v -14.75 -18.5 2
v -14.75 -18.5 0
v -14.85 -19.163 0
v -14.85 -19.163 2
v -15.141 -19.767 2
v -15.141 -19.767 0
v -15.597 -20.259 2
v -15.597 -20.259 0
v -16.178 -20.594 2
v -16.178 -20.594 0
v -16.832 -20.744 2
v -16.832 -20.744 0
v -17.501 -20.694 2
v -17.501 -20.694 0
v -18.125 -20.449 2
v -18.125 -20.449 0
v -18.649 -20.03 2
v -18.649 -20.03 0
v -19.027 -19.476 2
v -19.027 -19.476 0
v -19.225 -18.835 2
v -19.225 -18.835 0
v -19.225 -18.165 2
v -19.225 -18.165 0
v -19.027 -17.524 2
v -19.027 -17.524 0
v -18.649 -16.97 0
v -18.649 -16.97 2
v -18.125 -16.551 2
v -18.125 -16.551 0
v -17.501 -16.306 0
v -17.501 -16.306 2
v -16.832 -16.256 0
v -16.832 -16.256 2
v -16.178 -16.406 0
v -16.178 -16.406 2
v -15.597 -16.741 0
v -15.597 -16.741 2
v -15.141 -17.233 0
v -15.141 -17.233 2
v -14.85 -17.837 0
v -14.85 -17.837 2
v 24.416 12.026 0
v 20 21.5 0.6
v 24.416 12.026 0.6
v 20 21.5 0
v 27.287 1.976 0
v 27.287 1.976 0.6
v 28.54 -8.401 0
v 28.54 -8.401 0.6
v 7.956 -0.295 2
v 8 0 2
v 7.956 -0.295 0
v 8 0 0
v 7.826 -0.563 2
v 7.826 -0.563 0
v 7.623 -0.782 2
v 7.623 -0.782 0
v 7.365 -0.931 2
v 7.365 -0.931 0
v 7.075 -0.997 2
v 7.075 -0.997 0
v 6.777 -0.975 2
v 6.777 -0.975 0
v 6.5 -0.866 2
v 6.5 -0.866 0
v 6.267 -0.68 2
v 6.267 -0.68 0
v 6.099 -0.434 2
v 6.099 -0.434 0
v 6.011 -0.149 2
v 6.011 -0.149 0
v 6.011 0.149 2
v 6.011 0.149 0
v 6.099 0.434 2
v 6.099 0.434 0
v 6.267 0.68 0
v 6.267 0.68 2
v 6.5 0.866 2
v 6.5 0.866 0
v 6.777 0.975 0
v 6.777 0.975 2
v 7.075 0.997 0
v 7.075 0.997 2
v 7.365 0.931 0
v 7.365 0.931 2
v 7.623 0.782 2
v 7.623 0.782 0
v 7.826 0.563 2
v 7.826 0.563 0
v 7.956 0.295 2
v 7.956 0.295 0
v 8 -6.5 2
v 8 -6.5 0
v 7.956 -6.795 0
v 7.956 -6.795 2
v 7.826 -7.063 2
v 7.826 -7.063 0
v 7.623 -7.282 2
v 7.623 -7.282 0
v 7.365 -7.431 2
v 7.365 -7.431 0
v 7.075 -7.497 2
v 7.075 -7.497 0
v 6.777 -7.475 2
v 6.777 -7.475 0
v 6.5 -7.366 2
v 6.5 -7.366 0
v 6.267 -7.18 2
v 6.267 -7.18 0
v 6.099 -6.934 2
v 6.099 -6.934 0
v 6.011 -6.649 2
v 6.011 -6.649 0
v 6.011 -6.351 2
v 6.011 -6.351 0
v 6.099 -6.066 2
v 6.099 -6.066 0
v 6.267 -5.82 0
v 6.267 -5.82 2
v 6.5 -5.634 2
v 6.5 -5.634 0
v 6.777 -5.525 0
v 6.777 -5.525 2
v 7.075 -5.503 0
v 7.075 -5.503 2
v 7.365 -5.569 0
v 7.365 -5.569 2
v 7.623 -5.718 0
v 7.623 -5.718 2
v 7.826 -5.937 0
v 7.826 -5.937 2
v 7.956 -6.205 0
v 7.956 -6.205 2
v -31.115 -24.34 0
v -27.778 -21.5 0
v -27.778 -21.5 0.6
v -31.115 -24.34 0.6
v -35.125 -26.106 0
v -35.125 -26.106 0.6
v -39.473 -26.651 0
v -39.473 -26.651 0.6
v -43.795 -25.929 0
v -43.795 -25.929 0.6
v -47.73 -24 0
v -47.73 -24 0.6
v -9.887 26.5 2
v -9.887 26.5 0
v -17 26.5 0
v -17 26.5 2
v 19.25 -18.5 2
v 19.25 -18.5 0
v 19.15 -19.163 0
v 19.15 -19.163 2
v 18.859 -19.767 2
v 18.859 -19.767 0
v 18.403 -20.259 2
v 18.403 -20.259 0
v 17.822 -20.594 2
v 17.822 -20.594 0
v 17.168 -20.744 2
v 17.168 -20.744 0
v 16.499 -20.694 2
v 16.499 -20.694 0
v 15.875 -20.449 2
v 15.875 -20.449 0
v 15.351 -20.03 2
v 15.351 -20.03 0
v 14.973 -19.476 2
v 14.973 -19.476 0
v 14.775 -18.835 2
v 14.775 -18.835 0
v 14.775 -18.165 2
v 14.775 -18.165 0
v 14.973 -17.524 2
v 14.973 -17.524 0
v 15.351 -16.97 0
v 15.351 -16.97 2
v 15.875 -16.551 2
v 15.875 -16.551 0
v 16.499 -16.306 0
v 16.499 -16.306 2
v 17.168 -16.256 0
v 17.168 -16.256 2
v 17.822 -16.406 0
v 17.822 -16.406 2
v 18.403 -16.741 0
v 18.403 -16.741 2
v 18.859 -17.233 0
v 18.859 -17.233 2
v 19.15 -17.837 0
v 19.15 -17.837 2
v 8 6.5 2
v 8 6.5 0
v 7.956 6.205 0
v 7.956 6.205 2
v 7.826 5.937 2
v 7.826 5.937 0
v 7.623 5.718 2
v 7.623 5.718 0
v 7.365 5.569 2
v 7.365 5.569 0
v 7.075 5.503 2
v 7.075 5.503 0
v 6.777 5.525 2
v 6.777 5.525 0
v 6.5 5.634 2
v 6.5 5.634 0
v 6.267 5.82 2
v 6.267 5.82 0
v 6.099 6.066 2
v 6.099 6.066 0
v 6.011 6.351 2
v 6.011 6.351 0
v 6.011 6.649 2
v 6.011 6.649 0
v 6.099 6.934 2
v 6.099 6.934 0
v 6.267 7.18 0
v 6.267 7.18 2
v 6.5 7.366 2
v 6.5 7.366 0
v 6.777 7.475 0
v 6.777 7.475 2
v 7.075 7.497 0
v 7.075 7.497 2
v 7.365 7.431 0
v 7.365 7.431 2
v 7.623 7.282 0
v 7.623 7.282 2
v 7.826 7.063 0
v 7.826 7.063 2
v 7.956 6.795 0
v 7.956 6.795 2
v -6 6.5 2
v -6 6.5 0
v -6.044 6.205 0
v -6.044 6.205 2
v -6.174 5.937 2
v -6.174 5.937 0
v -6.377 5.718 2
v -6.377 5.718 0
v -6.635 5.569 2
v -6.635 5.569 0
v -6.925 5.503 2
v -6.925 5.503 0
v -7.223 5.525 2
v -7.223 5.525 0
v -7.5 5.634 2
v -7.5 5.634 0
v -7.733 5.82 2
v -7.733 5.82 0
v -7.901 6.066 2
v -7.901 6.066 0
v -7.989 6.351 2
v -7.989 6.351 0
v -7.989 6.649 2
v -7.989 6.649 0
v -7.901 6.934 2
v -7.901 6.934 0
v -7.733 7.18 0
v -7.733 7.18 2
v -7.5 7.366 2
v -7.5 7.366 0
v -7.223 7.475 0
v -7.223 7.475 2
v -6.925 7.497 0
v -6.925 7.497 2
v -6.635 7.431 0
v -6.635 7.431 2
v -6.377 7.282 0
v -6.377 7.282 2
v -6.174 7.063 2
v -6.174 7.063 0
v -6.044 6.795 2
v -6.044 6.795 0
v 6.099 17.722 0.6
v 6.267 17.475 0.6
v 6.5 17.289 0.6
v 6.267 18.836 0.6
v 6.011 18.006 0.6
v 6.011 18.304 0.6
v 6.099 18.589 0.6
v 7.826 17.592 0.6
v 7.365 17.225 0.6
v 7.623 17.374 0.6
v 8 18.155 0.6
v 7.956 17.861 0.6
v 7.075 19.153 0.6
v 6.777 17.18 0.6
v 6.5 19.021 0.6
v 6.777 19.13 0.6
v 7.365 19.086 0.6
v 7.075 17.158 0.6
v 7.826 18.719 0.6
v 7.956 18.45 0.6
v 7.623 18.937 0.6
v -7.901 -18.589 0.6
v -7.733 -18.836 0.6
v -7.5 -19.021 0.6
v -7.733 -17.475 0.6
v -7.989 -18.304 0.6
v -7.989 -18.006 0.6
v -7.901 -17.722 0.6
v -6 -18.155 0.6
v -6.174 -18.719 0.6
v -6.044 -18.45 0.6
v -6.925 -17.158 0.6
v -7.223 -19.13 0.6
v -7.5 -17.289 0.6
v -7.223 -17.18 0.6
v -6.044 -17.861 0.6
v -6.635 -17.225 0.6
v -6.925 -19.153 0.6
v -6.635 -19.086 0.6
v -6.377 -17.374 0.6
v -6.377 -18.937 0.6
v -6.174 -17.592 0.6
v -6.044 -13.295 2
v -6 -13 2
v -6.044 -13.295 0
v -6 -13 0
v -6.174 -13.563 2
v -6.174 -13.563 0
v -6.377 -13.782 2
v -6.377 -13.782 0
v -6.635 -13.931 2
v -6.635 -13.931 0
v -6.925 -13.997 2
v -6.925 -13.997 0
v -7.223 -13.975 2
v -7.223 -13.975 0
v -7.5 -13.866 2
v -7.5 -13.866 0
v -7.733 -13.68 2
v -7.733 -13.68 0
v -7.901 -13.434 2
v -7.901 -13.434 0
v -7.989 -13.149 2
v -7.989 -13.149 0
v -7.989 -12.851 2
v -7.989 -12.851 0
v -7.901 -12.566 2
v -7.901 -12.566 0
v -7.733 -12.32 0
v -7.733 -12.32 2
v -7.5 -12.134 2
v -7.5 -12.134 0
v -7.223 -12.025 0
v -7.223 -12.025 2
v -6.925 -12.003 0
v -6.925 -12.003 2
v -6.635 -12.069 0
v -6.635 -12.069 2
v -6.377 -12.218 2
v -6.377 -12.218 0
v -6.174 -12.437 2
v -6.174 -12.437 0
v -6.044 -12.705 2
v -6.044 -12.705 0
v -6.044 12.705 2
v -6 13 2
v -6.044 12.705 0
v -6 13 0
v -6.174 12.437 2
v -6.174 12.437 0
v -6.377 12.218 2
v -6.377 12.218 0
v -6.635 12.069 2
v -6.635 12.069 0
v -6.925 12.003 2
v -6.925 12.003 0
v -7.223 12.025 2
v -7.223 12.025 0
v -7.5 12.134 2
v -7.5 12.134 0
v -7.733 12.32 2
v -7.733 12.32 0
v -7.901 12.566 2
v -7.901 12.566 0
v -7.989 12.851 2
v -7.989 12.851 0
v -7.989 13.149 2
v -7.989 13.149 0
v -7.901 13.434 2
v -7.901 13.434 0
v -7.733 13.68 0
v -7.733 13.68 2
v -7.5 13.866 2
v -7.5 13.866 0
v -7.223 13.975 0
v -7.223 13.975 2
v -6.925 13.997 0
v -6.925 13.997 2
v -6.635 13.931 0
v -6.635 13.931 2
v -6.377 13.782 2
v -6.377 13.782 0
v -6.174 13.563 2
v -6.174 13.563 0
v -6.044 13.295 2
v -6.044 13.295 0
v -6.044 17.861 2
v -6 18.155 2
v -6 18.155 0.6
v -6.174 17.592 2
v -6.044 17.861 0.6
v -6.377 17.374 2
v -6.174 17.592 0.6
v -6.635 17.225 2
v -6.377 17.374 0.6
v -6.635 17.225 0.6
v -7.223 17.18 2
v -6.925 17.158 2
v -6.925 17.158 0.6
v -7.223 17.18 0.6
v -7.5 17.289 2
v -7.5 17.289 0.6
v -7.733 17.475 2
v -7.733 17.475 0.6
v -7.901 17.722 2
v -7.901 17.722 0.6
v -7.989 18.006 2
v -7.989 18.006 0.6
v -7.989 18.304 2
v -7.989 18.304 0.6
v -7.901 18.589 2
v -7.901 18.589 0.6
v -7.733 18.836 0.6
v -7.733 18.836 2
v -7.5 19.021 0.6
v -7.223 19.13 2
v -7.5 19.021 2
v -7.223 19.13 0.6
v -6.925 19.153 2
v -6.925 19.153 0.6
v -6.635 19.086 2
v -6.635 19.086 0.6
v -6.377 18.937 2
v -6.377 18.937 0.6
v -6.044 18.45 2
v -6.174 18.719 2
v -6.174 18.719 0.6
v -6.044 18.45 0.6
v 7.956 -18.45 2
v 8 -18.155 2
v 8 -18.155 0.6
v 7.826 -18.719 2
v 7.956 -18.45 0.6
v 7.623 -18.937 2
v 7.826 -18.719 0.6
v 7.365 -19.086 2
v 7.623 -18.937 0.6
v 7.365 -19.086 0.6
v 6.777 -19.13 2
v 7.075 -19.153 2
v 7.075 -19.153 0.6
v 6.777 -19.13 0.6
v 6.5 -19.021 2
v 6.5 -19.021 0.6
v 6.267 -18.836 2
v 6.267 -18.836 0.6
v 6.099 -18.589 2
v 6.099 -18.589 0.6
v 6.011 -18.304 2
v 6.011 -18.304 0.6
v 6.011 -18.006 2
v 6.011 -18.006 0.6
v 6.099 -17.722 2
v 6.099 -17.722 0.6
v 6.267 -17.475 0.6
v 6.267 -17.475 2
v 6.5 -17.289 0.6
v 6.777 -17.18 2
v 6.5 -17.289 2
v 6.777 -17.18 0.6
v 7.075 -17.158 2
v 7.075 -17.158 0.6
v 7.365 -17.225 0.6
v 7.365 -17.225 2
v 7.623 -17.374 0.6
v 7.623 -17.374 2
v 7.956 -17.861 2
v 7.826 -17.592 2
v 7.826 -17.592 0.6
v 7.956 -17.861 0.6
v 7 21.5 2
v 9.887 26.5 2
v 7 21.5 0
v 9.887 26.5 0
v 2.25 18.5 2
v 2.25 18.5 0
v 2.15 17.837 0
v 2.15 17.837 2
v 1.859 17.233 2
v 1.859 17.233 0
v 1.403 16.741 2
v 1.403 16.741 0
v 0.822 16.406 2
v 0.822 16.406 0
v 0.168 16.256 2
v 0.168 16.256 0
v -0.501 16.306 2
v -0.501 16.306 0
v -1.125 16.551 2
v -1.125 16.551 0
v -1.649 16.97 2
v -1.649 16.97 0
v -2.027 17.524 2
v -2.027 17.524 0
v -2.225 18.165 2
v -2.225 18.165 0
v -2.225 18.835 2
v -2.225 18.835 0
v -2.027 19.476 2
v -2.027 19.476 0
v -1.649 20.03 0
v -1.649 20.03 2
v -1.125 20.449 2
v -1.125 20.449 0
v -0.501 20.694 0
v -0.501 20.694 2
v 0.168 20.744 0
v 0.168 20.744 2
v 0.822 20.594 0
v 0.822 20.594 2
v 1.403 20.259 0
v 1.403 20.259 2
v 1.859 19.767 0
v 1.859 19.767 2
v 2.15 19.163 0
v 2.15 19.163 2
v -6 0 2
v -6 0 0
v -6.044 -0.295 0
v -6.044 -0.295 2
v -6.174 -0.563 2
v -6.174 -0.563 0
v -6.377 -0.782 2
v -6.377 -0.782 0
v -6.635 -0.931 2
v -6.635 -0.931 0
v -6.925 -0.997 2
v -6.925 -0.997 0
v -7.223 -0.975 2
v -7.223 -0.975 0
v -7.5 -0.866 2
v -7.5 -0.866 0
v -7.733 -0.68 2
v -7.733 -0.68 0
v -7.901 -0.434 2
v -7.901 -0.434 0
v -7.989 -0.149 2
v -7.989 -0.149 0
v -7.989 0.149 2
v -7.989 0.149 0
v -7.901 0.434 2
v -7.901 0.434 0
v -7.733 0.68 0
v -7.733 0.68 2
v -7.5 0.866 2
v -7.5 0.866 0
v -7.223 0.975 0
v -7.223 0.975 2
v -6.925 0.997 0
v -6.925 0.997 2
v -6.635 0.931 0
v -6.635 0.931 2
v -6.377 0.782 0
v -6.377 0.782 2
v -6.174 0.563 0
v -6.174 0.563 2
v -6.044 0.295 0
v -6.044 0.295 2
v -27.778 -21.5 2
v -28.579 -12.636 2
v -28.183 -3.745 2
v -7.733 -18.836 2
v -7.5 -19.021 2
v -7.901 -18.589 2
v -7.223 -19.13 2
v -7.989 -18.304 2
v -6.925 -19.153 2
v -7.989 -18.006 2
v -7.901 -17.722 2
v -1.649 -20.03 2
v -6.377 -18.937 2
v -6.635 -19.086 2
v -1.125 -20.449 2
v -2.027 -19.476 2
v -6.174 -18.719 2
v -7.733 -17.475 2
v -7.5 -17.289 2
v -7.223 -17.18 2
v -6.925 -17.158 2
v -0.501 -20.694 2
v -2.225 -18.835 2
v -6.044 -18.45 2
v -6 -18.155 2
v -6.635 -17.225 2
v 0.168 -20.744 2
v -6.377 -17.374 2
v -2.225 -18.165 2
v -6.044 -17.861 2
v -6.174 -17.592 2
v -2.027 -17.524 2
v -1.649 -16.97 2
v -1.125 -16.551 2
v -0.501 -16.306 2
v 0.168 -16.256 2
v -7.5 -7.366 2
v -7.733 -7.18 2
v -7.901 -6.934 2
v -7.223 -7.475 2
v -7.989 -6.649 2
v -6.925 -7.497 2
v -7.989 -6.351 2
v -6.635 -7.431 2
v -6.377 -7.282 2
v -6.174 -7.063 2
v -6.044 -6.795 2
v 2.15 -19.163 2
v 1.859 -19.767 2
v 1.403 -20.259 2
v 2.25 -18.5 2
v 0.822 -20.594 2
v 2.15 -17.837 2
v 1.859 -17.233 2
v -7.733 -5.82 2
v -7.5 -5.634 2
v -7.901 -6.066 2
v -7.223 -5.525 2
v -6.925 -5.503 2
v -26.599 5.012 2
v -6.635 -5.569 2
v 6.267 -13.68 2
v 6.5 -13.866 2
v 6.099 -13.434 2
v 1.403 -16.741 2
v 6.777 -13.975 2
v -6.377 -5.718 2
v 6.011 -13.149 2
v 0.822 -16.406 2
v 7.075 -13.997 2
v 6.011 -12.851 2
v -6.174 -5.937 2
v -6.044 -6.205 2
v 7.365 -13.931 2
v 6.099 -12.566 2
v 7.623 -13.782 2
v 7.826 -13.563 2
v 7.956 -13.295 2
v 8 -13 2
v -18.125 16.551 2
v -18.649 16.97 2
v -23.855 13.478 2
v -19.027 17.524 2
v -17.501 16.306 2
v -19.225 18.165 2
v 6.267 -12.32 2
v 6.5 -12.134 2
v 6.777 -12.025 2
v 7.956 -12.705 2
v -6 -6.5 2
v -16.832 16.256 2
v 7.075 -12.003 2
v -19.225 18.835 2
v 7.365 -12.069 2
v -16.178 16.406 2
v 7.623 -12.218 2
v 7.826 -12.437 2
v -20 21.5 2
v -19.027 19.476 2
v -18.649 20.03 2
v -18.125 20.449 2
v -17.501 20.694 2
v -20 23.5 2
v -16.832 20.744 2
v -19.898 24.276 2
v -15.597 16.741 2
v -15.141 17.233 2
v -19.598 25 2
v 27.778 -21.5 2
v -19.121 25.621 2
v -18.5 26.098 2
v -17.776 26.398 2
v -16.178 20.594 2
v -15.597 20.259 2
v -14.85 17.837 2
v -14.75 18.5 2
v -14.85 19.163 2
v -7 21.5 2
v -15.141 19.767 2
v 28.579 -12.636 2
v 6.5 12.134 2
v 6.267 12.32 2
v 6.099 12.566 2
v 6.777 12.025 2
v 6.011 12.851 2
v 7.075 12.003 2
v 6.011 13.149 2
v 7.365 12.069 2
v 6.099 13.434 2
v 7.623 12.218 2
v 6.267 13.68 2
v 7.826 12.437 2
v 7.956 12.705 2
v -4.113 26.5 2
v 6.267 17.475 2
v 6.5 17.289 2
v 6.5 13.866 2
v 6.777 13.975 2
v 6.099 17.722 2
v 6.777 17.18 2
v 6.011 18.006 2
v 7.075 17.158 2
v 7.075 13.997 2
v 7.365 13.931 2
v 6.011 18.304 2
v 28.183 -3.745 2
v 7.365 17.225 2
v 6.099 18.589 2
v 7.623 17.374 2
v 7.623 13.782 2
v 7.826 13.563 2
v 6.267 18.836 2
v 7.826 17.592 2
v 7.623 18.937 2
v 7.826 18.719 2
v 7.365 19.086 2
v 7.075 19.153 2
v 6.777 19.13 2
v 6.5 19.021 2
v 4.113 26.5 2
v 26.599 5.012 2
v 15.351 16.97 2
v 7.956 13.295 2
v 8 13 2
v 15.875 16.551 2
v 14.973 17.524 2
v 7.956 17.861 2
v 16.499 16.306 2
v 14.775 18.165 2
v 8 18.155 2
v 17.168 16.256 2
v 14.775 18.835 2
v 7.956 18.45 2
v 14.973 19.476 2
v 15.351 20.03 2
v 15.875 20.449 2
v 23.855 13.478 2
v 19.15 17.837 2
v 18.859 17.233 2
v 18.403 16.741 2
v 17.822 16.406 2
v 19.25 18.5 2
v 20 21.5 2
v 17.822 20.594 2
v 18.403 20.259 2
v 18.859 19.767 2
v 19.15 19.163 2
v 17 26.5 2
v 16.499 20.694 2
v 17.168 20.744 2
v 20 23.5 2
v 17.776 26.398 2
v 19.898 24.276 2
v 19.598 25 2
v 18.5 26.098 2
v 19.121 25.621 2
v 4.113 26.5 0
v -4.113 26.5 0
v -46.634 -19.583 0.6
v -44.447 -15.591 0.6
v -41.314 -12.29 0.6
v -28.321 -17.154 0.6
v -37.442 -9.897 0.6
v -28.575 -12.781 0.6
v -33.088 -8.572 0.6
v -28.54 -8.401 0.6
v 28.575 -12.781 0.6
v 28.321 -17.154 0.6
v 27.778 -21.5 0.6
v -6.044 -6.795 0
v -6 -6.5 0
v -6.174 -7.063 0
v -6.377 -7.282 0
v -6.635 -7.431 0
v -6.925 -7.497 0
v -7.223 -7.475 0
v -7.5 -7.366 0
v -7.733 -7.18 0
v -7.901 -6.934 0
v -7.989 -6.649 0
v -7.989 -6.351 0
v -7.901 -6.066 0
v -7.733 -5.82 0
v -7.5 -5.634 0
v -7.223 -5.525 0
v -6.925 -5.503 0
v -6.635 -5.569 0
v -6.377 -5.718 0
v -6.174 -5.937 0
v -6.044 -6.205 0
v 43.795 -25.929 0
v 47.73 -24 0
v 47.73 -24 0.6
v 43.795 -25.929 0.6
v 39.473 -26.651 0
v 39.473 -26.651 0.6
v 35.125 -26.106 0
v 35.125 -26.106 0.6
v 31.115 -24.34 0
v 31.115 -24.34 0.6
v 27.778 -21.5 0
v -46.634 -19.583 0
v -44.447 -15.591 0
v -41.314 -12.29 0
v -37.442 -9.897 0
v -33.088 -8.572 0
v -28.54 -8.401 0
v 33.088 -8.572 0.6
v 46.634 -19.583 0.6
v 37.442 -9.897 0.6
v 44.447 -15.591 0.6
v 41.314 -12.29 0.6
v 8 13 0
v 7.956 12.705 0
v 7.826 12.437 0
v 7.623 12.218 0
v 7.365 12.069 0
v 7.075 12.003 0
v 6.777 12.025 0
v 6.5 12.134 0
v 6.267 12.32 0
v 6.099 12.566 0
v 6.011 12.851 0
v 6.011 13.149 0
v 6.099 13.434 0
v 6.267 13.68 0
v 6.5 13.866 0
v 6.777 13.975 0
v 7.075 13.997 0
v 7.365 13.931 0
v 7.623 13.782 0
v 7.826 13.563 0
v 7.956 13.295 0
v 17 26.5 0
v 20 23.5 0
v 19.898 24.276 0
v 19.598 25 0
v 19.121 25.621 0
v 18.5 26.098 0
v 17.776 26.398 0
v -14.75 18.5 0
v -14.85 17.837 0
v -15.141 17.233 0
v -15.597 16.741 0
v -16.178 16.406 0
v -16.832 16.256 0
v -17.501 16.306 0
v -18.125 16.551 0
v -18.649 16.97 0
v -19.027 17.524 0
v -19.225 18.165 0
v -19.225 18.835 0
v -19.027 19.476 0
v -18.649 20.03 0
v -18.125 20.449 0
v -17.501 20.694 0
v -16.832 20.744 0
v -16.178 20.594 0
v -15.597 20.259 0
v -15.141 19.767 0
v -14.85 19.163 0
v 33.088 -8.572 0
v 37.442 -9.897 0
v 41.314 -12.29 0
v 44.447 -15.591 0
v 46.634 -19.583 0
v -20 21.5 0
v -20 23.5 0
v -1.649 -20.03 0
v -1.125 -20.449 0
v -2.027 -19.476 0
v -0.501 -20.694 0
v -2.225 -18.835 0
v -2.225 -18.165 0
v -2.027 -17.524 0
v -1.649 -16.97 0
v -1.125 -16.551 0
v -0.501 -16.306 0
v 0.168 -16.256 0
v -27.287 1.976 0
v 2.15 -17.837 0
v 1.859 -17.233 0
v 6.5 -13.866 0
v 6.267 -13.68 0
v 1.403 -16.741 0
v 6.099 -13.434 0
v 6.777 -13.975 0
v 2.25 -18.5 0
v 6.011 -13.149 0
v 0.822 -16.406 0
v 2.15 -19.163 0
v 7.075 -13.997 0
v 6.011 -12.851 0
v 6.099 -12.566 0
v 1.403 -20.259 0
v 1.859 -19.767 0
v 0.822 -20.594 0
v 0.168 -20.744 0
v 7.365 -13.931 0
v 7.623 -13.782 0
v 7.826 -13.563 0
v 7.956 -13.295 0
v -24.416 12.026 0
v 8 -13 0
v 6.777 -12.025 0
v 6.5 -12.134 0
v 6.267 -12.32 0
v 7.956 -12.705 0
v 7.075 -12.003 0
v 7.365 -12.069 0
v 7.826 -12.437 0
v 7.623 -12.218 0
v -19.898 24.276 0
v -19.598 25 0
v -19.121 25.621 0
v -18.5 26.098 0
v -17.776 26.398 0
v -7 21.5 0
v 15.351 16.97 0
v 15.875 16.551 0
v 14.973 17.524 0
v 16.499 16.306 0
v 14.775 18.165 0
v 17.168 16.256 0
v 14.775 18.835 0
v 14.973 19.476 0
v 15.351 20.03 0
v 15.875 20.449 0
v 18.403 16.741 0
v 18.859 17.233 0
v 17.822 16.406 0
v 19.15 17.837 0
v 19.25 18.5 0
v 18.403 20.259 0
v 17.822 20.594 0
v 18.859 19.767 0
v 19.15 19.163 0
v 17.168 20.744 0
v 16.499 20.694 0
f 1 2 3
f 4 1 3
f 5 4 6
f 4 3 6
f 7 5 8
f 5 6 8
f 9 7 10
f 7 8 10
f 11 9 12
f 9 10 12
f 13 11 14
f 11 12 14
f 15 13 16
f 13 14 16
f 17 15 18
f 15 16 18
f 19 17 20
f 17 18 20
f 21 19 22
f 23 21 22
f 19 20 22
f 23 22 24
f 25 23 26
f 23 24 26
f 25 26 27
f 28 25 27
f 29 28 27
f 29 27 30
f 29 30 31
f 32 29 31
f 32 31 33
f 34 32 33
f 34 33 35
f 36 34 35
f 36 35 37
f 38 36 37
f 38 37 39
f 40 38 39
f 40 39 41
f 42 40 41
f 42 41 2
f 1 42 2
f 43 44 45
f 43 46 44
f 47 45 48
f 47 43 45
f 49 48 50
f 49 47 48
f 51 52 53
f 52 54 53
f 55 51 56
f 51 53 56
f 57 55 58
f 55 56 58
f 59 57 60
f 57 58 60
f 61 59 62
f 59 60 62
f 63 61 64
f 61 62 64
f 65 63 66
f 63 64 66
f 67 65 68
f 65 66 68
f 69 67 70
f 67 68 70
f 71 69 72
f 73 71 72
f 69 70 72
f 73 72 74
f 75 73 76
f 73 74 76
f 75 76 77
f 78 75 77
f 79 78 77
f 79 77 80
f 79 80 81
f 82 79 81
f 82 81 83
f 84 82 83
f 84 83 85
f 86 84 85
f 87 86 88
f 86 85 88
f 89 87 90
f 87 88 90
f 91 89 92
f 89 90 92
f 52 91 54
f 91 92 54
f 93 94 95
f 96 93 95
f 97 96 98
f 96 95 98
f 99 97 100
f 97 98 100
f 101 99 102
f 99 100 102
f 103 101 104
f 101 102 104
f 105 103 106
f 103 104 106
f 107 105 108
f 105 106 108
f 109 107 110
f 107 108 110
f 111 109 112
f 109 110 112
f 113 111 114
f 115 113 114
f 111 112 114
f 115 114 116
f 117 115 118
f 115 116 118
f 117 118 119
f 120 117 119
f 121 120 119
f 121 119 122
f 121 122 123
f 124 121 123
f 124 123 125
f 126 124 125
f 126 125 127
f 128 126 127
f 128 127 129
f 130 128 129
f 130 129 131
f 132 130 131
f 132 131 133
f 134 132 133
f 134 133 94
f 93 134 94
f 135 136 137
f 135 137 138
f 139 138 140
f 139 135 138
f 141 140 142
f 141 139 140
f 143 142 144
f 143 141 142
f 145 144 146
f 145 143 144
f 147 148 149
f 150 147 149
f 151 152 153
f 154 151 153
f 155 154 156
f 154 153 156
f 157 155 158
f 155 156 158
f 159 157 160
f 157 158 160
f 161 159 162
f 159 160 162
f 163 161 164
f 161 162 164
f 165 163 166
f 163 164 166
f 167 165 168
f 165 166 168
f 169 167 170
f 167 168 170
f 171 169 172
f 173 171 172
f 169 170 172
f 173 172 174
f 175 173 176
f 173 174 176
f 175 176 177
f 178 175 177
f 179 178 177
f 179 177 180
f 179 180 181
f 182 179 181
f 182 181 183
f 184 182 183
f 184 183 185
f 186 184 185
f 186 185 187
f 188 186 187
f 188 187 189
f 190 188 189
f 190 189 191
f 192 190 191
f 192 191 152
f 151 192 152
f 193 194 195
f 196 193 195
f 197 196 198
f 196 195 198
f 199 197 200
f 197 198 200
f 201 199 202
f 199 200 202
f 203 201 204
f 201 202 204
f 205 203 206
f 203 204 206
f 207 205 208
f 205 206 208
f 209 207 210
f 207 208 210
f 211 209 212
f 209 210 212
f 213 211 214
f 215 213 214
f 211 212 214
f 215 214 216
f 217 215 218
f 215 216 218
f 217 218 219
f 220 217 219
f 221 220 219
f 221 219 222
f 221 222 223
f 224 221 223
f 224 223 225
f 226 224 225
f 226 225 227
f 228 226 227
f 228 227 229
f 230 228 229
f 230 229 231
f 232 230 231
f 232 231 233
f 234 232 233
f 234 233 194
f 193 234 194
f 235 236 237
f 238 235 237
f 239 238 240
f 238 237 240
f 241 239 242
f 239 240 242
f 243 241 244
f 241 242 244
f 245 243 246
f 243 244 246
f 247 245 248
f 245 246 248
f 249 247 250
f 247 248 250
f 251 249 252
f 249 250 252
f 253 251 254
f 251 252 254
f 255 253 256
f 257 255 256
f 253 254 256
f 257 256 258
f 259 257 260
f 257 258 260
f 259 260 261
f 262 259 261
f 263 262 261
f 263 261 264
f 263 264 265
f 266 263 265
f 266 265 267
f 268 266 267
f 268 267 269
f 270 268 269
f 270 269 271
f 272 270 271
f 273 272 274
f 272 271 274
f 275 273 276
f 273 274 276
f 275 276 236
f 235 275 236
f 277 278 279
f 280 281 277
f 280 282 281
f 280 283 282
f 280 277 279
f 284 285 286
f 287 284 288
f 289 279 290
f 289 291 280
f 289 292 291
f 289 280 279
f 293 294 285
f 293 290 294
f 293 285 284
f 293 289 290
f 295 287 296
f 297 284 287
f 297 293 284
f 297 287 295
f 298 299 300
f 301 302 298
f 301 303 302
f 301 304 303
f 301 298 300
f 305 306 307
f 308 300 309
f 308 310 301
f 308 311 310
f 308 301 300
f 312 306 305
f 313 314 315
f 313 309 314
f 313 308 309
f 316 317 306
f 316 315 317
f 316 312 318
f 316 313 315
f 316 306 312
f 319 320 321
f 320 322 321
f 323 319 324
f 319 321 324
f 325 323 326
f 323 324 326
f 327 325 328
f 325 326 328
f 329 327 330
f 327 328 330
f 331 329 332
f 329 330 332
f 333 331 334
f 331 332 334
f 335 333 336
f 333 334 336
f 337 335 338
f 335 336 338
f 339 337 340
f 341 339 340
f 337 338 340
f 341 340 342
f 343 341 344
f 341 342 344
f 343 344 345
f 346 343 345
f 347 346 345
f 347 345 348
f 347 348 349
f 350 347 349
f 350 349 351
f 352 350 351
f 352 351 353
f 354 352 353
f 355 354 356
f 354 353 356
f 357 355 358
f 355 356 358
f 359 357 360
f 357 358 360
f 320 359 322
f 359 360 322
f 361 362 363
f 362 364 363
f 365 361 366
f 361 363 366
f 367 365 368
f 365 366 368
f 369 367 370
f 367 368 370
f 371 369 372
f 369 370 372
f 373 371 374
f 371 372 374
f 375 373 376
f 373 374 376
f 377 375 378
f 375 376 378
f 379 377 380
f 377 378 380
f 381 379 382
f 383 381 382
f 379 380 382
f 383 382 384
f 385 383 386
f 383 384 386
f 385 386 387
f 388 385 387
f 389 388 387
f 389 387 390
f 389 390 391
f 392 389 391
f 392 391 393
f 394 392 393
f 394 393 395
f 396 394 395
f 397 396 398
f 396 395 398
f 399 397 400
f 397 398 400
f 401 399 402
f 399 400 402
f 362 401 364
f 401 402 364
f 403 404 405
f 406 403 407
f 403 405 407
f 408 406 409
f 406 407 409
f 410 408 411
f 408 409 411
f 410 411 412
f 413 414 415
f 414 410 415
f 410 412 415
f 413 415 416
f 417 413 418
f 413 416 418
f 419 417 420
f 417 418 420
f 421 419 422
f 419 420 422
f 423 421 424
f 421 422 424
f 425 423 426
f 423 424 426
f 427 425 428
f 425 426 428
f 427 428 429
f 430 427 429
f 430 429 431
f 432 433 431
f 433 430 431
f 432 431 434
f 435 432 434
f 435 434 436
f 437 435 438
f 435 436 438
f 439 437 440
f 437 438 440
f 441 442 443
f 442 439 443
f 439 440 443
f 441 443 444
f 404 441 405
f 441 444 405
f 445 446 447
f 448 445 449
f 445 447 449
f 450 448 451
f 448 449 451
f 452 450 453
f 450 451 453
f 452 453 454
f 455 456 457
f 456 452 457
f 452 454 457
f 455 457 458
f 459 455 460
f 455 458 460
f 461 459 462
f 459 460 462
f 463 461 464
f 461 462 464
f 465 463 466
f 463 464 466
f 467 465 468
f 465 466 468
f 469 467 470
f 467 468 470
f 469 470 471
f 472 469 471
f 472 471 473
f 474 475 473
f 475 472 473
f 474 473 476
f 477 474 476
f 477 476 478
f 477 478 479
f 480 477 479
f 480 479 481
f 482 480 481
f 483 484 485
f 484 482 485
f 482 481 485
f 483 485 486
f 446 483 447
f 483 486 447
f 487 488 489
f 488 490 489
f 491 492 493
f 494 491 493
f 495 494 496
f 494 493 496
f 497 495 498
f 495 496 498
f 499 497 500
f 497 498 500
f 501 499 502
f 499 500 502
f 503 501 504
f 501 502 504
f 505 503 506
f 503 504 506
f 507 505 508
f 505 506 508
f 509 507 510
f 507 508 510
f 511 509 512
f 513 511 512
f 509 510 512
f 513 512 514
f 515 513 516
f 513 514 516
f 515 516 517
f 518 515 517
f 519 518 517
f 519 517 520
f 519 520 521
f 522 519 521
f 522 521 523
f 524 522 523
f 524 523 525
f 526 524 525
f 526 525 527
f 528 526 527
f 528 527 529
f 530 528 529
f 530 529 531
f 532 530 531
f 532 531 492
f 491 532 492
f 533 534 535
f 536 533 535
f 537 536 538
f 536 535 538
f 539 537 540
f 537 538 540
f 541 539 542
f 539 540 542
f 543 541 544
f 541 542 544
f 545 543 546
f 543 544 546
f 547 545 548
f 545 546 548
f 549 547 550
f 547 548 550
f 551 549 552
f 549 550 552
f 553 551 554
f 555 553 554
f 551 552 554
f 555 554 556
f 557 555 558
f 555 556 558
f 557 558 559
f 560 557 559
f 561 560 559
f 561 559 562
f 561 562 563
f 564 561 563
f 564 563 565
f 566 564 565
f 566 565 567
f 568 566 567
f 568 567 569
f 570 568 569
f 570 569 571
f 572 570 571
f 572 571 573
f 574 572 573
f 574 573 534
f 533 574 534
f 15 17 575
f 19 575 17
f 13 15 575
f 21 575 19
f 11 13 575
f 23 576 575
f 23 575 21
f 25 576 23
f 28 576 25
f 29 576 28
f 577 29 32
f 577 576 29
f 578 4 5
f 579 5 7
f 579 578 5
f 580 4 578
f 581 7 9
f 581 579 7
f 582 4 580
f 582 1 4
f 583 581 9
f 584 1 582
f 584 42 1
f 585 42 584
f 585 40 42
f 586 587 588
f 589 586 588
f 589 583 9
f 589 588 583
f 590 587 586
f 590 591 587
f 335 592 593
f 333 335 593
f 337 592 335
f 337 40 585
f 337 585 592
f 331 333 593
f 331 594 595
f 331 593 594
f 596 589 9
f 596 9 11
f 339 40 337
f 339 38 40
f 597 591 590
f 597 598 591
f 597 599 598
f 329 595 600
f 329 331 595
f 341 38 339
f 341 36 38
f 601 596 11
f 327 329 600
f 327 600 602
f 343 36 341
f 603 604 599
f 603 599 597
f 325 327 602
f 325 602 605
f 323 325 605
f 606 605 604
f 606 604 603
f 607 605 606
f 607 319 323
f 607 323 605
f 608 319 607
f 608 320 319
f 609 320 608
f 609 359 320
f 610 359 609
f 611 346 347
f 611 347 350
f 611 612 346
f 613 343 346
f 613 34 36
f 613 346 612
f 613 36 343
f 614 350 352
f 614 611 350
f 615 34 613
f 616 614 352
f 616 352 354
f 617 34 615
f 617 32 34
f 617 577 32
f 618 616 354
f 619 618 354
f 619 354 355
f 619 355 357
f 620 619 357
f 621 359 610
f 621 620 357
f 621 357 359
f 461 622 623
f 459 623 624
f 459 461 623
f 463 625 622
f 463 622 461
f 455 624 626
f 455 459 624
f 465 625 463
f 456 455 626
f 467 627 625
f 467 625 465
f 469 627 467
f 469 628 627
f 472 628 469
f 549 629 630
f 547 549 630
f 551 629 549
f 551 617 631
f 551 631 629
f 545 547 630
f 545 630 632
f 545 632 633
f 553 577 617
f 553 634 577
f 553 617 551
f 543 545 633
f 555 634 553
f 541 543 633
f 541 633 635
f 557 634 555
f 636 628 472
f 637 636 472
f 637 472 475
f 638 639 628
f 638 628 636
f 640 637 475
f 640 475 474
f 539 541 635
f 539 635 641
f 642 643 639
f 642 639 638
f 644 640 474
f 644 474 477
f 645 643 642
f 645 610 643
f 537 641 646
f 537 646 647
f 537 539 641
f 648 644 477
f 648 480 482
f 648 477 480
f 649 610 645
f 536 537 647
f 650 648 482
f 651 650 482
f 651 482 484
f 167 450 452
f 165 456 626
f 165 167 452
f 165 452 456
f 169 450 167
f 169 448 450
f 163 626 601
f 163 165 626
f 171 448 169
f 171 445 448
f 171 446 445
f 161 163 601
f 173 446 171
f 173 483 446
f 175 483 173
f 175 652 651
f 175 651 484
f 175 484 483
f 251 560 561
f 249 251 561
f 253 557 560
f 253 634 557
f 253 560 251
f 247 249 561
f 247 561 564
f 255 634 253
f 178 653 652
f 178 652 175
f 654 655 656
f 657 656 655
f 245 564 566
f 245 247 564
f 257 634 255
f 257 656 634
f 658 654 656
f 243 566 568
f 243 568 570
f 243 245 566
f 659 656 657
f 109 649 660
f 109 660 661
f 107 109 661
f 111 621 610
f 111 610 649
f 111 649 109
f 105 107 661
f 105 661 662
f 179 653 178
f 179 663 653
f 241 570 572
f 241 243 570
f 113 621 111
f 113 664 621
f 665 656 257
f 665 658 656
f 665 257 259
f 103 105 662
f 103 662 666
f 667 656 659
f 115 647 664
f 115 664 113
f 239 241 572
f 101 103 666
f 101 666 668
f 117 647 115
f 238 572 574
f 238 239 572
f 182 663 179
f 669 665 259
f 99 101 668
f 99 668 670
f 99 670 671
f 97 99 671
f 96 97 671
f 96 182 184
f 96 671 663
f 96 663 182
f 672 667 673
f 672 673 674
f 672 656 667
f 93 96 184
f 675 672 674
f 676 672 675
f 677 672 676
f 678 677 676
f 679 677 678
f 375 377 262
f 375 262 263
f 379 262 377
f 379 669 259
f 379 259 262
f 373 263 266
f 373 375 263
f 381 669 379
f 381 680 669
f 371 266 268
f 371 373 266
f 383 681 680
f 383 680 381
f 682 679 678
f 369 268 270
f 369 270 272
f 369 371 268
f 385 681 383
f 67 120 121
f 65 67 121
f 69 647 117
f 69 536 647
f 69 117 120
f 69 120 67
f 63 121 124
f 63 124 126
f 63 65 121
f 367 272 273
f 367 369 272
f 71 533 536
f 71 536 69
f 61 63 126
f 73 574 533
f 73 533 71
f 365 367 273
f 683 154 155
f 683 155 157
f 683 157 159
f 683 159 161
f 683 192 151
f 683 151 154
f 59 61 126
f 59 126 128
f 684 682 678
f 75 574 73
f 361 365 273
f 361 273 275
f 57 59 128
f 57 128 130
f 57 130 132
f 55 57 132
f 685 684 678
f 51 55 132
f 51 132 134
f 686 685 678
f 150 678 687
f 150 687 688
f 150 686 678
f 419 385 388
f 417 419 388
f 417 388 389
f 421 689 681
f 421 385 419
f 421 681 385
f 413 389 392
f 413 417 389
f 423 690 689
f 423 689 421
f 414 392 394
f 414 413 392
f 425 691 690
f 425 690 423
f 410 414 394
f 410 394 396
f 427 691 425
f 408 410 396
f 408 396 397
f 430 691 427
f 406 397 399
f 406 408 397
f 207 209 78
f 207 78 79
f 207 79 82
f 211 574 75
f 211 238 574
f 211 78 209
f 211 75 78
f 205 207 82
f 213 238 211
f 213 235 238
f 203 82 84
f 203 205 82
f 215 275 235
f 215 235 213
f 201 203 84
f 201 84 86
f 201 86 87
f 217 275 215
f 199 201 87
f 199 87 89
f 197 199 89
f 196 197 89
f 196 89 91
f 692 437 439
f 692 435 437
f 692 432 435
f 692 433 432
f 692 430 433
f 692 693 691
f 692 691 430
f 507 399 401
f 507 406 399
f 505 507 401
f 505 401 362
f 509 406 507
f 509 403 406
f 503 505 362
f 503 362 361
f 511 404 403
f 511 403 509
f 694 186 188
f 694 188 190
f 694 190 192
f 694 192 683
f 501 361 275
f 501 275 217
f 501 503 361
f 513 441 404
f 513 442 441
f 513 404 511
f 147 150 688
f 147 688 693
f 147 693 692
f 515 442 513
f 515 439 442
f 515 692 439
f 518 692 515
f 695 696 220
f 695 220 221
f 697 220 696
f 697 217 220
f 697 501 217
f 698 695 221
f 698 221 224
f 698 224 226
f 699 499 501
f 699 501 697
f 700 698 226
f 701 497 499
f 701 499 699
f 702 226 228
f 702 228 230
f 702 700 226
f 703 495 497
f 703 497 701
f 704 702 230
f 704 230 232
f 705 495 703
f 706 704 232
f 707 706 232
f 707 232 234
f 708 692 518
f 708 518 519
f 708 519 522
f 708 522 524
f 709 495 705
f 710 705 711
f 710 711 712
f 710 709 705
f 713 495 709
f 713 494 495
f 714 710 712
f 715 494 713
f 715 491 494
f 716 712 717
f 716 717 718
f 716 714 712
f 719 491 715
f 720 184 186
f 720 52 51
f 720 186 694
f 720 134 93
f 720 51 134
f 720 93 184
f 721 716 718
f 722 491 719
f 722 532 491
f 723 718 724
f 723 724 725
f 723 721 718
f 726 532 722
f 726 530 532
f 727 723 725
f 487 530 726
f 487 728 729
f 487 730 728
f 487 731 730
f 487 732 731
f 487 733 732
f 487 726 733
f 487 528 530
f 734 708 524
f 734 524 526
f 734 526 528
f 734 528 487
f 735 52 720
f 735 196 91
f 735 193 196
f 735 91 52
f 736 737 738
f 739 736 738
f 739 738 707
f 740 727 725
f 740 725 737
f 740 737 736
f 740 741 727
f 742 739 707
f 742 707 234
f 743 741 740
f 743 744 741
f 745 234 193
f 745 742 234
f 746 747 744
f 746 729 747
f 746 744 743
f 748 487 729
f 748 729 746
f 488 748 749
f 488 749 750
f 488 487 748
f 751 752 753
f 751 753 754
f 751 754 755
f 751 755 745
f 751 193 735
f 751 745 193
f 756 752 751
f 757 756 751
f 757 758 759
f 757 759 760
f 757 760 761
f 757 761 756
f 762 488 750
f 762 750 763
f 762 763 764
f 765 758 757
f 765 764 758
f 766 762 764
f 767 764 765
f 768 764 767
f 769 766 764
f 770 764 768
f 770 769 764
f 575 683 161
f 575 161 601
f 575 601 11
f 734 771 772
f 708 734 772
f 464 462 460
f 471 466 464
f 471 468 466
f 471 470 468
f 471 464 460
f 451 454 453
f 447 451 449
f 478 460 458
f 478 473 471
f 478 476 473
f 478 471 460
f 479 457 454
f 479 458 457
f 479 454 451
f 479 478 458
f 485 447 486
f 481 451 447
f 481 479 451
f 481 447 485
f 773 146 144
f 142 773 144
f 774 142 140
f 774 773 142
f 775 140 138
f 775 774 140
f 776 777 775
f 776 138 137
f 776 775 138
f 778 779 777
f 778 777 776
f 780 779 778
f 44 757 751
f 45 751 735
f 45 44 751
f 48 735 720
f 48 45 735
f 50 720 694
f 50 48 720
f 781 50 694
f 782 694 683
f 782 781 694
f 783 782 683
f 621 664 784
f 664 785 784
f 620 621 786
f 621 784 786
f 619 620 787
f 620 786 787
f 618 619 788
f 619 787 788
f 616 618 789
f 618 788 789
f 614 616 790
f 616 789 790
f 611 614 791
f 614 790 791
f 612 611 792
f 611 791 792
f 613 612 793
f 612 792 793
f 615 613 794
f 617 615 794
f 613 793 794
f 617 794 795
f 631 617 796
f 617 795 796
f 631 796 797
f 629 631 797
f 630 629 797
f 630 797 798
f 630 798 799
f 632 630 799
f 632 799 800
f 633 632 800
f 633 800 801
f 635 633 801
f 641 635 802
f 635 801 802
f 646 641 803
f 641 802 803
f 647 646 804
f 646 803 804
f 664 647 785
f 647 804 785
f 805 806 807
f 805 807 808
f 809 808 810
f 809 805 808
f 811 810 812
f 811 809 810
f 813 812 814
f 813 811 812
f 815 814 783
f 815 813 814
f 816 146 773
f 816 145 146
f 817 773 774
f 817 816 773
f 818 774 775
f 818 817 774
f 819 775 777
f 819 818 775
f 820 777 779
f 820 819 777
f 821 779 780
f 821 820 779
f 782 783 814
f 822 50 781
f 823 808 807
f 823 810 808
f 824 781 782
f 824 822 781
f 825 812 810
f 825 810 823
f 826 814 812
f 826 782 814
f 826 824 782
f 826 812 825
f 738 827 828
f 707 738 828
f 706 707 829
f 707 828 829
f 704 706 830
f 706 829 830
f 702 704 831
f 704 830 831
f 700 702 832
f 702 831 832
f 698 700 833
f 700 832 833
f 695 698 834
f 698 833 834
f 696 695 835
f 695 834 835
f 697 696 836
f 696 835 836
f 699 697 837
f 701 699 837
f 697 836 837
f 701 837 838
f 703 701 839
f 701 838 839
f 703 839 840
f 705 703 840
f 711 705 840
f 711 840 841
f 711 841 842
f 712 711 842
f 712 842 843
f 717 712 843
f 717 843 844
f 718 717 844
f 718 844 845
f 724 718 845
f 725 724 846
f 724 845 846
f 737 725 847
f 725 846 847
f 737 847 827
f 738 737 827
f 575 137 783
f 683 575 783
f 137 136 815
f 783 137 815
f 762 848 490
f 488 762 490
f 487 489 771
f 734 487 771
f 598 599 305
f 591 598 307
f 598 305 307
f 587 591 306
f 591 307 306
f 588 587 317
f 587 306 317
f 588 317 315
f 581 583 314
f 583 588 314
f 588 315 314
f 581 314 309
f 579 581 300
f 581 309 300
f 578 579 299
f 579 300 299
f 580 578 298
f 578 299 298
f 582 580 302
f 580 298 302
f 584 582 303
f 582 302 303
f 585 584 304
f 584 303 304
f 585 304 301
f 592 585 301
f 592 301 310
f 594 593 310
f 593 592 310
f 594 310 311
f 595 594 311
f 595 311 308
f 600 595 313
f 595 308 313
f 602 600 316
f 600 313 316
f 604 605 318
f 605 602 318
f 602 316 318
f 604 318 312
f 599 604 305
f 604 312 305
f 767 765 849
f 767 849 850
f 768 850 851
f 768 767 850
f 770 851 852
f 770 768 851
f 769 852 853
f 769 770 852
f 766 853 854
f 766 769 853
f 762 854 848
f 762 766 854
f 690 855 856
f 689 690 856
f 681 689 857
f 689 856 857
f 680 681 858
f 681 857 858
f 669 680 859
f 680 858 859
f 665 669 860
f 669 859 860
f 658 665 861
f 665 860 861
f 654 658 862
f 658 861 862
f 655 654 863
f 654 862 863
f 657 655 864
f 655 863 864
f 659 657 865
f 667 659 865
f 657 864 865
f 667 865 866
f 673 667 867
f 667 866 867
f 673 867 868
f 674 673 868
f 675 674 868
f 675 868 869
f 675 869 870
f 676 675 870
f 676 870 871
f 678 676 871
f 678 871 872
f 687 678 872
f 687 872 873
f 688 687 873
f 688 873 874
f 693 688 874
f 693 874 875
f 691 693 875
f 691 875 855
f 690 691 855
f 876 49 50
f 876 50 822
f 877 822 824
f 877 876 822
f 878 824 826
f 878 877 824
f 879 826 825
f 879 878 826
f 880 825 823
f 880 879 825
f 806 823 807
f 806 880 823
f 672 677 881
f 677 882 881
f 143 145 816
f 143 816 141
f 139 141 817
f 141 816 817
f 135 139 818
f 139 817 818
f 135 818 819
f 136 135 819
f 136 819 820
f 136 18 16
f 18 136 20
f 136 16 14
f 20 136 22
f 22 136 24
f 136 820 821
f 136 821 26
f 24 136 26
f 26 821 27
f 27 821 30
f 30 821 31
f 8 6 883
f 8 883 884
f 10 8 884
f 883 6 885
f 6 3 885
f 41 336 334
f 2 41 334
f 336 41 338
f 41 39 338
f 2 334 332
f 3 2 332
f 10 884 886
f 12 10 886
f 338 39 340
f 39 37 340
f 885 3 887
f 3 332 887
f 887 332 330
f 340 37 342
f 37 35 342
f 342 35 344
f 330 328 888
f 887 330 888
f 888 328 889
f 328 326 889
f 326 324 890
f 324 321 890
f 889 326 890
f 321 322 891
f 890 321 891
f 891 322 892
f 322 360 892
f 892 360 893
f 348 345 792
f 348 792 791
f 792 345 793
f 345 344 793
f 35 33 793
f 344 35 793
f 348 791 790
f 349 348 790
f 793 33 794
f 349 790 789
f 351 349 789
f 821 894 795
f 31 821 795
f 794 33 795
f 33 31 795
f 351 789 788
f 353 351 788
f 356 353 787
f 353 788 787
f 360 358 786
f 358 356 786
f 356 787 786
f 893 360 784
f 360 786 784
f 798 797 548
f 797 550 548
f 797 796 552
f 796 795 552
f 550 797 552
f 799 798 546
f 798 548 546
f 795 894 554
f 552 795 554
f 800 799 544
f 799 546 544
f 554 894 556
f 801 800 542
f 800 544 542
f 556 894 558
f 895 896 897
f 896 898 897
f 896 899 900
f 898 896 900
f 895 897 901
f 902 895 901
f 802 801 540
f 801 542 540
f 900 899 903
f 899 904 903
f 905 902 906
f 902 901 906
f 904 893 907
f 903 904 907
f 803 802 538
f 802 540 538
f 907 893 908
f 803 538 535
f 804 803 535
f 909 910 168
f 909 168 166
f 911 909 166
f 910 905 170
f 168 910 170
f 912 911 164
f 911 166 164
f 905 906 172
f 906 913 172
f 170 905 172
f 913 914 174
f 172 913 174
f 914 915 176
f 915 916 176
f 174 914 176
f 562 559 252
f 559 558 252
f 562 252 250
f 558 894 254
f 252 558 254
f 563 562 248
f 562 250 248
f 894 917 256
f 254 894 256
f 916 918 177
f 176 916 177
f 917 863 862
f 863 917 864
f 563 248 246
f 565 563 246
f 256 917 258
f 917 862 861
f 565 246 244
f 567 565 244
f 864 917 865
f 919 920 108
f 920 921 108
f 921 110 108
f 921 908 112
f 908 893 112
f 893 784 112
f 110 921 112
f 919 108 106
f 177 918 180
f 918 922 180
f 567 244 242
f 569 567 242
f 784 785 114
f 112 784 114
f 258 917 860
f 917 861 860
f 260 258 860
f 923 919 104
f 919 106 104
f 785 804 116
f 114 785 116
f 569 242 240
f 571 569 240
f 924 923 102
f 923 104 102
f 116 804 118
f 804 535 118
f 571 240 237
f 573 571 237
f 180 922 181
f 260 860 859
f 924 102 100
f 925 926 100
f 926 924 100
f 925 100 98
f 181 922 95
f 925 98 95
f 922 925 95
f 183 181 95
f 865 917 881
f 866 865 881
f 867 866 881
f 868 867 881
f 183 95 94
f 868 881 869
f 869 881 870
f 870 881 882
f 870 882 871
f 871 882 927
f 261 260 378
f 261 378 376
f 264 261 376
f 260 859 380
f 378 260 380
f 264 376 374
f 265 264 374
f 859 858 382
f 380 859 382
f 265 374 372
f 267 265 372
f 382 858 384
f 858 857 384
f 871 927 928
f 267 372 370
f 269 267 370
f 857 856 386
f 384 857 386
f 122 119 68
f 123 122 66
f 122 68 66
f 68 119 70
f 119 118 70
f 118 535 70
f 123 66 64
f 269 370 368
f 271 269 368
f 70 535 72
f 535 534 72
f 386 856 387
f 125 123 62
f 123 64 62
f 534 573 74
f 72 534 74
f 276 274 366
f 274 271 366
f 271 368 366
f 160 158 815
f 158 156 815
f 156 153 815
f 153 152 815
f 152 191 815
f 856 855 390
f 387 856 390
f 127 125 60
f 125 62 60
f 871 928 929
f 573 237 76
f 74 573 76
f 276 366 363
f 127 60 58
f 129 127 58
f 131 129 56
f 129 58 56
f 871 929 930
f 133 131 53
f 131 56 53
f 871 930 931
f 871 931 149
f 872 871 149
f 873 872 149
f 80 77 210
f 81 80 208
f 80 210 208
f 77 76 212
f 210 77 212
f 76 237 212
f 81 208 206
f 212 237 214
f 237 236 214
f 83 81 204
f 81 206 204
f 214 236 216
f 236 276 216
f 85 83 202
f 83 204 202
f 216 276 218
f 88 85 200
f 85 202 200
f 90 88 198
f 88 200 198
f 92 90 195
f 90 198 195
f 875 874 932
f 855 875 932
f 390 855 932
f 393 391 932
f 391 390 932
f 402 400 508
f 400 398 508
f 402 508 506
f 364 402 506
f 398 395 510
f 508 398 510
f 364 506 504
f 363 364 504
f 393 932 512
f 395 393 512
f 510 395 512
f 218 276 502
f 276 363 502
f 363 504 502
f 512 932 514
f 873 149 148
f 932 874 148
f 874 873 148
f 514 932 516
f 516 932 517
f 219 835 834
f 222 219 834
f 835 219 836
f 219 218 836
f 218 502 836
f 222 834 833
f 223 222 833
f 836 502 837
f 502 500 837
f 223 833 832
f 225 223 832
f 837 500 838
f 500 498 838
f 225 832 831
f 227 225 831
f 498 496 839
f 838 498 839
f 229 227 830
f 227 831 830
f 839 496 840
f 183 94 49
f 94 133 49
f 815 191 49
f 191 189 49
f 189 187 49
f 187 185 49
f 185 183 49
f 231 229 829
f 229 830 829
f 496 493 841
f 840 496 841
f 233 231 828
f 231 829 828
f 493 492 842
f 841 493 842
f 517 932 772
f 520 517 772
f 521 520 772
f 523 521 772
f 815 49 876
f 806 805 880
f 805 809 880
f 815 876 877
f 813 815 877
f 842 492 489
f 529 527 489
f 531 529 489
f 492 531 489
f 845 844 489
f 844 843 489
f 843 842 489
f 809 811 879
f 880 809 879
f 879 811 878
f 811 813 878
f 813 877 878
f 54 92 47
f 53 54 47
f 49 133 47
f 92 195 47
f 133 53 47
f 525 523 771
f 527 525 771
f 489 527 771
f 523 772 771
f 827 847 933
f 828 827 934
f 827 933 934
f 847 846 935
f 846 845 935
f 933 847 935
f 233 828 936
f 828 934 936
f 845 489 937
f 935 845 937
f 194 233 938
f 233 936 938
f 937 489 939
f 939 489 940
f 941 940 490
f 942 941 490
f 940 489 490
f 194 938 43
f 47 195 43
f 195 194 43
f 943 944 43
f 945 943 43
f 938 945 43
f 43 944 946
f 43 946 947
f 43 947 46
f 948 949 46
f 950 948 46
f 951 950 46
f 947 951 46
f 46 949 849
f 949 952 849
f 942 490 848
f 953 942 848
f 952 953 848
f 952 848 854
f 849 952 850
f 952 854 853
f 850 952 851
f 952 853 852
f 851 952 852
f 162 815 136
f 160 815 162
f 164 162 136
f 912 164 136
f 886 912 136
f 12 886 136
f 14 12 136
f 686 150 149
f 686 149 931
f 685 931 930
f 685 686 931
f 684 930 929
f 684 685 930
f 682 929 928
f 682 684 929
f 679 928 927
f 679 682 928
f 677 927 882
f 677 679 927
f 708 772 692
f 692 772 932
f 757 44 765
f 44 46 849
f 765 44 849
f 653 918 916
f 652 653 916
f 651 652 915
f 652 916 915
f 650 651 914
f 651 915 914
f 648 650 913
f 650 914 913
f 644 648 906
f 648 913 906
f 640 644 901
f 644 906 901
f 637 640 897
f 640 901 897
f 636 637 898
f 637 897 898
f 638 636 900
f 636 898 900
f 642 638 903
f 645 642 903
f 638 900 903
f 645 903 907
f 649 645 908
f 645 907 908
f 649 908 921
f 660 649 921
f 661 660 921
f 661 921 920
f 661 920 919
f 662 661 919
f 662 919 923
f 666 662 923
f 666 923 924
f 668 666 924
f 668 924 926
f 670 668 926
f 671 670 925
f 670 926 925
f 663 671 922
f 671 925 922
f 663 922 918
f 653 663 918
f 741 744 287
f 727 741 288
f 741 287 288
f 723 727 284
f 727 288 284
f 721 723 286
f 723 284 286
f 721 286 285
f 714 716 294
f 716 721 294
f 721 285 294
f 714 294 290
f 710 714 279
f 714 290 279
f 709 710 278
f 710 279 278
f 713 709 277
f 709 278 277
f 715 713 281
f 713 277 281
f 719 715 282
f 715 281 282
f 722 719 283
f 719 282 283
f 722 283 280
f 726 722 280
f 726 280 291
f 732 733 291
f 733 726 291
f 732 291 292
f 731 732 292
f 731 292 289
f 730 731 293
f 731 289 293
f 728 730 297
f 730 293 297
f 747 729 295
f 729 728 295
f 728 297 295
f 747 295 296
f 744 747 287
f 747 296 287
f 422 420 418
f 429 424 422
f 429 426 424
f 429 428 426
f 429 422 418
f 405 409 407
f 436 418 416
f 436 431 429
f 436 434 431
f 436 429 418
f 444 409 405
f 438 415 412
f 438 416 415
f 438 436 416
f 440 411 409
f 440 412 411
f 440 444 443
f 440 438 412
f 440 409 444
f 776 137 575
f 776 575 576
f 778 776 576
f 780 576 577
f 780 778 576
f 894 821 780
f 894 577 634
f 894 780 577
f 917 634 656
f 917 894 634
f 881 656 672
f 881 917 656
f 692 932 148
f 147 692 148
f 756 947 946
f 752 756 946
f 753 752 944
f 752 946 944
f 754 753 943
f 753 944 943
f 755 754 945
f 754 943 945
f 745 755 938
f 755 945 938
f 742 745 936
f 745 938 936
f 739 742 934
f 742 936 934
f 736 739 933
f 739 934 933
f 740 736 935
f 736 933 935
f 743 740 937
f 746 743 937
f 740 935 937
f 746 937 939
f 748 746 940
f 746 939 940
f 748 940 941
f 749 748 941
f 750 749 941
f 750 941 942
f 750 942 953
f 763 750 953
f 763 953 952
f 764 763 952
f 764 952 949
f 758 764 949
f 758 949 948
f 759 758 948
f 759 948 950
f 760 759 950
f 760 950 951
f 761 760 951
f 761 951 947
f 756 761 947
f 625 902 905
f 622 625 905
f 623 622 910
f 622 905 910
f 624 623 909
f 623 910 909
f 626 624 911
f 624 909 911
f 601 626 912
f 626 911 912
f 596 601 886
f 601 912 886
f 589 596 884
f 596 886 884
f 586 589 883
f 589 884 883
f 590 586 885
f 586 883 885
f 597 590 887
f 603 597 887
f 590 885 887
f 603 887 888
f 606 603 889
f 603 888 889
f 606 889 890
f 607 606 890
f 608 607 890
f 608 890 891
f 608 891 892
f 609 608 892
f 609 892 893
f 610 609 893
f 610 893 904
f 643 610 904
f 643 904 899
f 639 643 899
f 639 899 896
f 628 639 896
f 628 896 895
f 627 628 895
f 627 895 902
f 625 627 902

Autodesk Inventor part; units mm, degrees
ref_plane "YZ Plane" through (0, 0, 0) normal (1, 0, 0) x (0, 1, 0)
ref_plane "XZ Plane" through (0, 0, 0) normal (0, 1, 0) x (-1, 0, 0)
ref_plane "XY Plane" through (0, 0, 0) normal (0, 0, 1) x (1, 0, 0)
sketch "Block1" plane through (0, 0, 0) normal (0, 0, 1) x (1, 0, 0)
  line L0 (22.5674, 54.9733) -> (22.5674, 26.9733) construction
  line L1 (62.5674, 54.9733) -> (62.5674, 26.9733) construction
  line L2 (42.5674, 54.9733) -> (42.5674, 26.9733) construction
  arc A0 (22.5674, 54.9733) -> (16.0189, 31.9733) centre (39.6923, 37.6653) ccw
  arc A1 (69.116, 31.9733) -> (62.5674, 54.9733) centre (45.4425, 37.6653) ccw
  line L3 (67.5674, 31.9733) -> (69.116, 31.9733)
  line L4 (22.5674, 54.9733) -> (62.5674, 54.9733)
  arc A2 (3.175, 28.049) -> (16.0189, 31.9733) centre (7.7246, 36.1392) ccw
  arc A3 (15.3685, 38.7512) -> (3.175, 28.049) centre (13.5542, 28.5209) ccw
  arc A4 (69.116, 31.9733) -> (81.9598, 28.049) centre (77.4102, 36.1392) ccw
  arc A5 (81.9598, 28.049) -> (69.7664, 38.7512) centre (71.5807, 28.5209) ccw
  line L5 (17.5674, 54.9733) -> (67.5674, 54.9733) construction
  line L6 (67.5674, 54.9733) -> (67.5674, 31.9733) construction
  line L7 (67.5674, 31.9733) -> (16.0189, 31.9733)
  line L8 (17.5674, 31.9733) -> (17.5674, 54.9733) construction
  line L9 (22.5674, 31.9733) -> (62.5674, 31.9733)
  line L10 (62.5674, 31.9733) -> (62.5674, 26.9733)
  line L11 (62.5674, 26.9733) -> (22.5674, 26.9733)
  line L12 (22.5674, 26.9733) -> (22.5674, 31.9733)
  circle A6 centre (35.5674, 51.6287) radius 1
  circle A7 centre (49.5674, 51.6287) radius 1
  line L13 (22.5674, 29.4733) -> (62.5674, 29.4733) construction
  circle A8 centre (35.5674, 29.4733) radius 1
  circle A9 centre (49.5674, 29.4733) radius 1
  point P0 (42.5377, 37.3132)
  point P1 (42.5674, 31.9733)
  point P2 (42.5674, 31.9733)
  point P3 (17.5674, 26.9733)
  point P4 (67.5674, 26.9733)
  dimension "d0" = 23
  dimension "d1" = 5
  dimension "d2" = 40
  dimension "d3" = 2
  dimension "d4" = 2
  dimension "d5" = 7
  dimension "d6" = 7
  dimension "d7" = 2
  dimension "d8" = 2
  dimension "d9" = 7
  dimension "d10" = 7
sketch "Sketch1" plane through (0, 0, 0) normal (0, 0, 1) x (1, 0, 0)
  line L0 (-20, 21.5) -> (-20, -26.5) construction
  line L1 (20, 21.5) -> (20, -26.5) construction
  line L2 (0, 21.5) -> (0, -26.5) construction
  arc A0 (-20, 21.5) -> (-27.7782, -21.5) centre (37.6183, -11.126) ccw
  arc A1 (27.7782, -21.5) -> (20, 21.5) centre (-37.6183, -11.126) ccw
  line L3 (25, -21.5) -> (27.7782, -21.5)
  line L4 (-20, 21.5) -> (20, 21.5)
  line L5 (-25, 21.5) -> (25, 21.5) construction
  line L6 (25, 21.5) -> (25, -21.5) construction
  line L7 (25, -21.5) -> (-27.7782, -21.5)
  line L8 (-25, -21.5) -> (-25, 21.5) construction
  line L9 (-20, -21.5) -> (20, -21.5)
  line L10 (20, -21.5) -> (20, -26.5)
  line L11 (20, -26.5) -> (-20, -26.5)
  line L12 (-20, -26.5) -> (-20, -21.5)
  circle A2 centre (-7, 18.1554) radius 1
  circle A3 centre (7, 18.1554) radius 1
  line L13 (-20, -24) -> (20, -24) construction
  circle A4 centre (-7, -24) radius 1
  circle A5 centre (7, -24) radius 1
  circle A6 centre (-17, -18.5) radius 2.25
  circle A7 centre (17, -18.5) radius 2.25
  circle A8 centre (0, -18.5) radius 2.25
  line L14 (-25, 0) -> (25, 0) construction
  line L15 (-20, 21.5) -> (20, 21.5)
  line L16 (20, 21.5) -> (20, 26.5)
  line L17 (20, 26.5) -> (-20, 26.5)
  line L18 (-20, 26.5) -> (-20, 21.5)
  line L19 (-7, 18.1554) -> (-7, 26.5) construction
  line L20 (-7, 21.5) -> (-9.8868, 26.5)
  line L21 (-9.8868, 26.5) -> (-4.1132, 26.5)
  line L22 (-4.1132, 26.5) -> (-7, 21.5)
  circle A9 centre (-7, 0) radius 1
  circle A10 centre (7, 0) radius 1
  circle A11 centre (-7, -18.1554) radius 1
  circle A12 centre (7, -18.1554) radius 1
  arc A13 (-47.7296, -24) -> (-27.7782, -21.5) centre (-39.1631, -11.5041) ccw
  arc A14 (-28.5398, -8.4011) -> (-47.7296, -24) centre (-30.1563, -26.0155) ccw
  arc A15 (27.7782, -21.5) -> (47.7296, -24) centre (39.1631, -11.5041) ccw
  arc A16 (47.7296, -24) -> (28.5398, -8.4011) centre (30.1563, -26.0155) ccw
  point P0 (0, 0)
  point P1 (0, -21.5)
  point P2 (0, -21.5)
  point P3 (-27.9814, 24.963)
  point P4 (27.9814, 24.963)
  point P5 (0, -2.5)
  point P6 (0, 0)
  dimension "d12" = 43
  dimension "d13" = 5
  dimension "d14" = 40
  dimension "d15" = 2
  dimension "d16" = 2
  dimension "d17" = 7
  dimension "d18" = 7
  dimension "d19" = 2
  dimension "d20" = 2
  dimension "d21" = 7
  dimension "d22" = 7
  dimension "d24" = 4.5
  dimension "d25" = 4.5
  dimension "d26" = 3
  dimension "d27" = 3
  dimension "d28" = 3
  dimension "d29" = 3
  dimension "d34" = 4.5
  dimension "d35" = 3
  dimension "d38" = 5
  dimension "d39" = 30
  dimension "d40" = 30
  dimension "d45" = 3.3446
  dimension "d46" = 3.3446
  dimension "d47" = 2
  dimension "d48" = 2
  dimension "d49" = 7
  dimension "d50" = 7
extrude "Extrusion1" add sketch "Sketch1" along normal blind 2 contours L4 A1 L3 L7 A0 | A6 | A7 | A8 | A9 | A10
extrude "Extrusion2" add sketch "Sketch1" along normal blind 0.6 contours L4 A1 L3 L7 A0 | A2 | A3 | A6 | A7 | A8 | A9 | A10 | A11 | A12
mirror "Mirror1" about plane through (0, 0, 0) normal (1, 0, 0) of "Extrusion2"
extrude "Extrusion3" cut sketch "Sketch1" along normal blind 5 contours A6 | A7 | A8
mirror "Mirror2" about plane through (0, 0, 0) normal (0, 1, 0) of "Extrusion3"
extrude "Extrusion4" add sketch "Sketch1" along normal blind 2 contours L18 L17 L20 L4 | L22 L17 L16 L4 | L20 L17 L22
extrude "Extrusion5" cut sketch "Sketch1" along normal blind 5 contours L20 L17 L22
extrude "Extrusion7" add sketch "Sketch1" along normal blind 0.6 contours A0 A13 A14
mirror "Mirror3" about plane through (0, 0, 0) normal (1, 0, 0) of "Extrusion5", "Extrusion7"
fillet "Fillet1" radius 3 2 edges at (-20, 26.5, 1) (20, 26.5, 1)
extrude "Extrusion8" cut sketch "Sketch1" along normal blind 10 contours A9 | A10
pattern_linear "Rectangular Pattern1" count 3 spacing 6.5 along (0, 1, 0) count 3 spacing 6.5 along (0, -1, 0) of "Extrusion8"
equation "\"d3\" = d11"
equation "\"d4\" = d11"
equation "\"d7\" = d11"
equation "\"d8\" = d11"
equation "\"d15\" = fishing"
equation "\"d16\" = fishing"
equation "\"d19\" = fishing"
equation "\"d20\" = fishing"
equation "\"d47\" = fishing"
equation "\"d48\" = fishing"
equation "\"d56\" = 2 * layer"
equation "\"d11\" = 2"
equation "\"d23\" = 2"
equation "\"fishing\" = 2"
equation "\"layer\" = 0.3"
properties part number "Piece"
